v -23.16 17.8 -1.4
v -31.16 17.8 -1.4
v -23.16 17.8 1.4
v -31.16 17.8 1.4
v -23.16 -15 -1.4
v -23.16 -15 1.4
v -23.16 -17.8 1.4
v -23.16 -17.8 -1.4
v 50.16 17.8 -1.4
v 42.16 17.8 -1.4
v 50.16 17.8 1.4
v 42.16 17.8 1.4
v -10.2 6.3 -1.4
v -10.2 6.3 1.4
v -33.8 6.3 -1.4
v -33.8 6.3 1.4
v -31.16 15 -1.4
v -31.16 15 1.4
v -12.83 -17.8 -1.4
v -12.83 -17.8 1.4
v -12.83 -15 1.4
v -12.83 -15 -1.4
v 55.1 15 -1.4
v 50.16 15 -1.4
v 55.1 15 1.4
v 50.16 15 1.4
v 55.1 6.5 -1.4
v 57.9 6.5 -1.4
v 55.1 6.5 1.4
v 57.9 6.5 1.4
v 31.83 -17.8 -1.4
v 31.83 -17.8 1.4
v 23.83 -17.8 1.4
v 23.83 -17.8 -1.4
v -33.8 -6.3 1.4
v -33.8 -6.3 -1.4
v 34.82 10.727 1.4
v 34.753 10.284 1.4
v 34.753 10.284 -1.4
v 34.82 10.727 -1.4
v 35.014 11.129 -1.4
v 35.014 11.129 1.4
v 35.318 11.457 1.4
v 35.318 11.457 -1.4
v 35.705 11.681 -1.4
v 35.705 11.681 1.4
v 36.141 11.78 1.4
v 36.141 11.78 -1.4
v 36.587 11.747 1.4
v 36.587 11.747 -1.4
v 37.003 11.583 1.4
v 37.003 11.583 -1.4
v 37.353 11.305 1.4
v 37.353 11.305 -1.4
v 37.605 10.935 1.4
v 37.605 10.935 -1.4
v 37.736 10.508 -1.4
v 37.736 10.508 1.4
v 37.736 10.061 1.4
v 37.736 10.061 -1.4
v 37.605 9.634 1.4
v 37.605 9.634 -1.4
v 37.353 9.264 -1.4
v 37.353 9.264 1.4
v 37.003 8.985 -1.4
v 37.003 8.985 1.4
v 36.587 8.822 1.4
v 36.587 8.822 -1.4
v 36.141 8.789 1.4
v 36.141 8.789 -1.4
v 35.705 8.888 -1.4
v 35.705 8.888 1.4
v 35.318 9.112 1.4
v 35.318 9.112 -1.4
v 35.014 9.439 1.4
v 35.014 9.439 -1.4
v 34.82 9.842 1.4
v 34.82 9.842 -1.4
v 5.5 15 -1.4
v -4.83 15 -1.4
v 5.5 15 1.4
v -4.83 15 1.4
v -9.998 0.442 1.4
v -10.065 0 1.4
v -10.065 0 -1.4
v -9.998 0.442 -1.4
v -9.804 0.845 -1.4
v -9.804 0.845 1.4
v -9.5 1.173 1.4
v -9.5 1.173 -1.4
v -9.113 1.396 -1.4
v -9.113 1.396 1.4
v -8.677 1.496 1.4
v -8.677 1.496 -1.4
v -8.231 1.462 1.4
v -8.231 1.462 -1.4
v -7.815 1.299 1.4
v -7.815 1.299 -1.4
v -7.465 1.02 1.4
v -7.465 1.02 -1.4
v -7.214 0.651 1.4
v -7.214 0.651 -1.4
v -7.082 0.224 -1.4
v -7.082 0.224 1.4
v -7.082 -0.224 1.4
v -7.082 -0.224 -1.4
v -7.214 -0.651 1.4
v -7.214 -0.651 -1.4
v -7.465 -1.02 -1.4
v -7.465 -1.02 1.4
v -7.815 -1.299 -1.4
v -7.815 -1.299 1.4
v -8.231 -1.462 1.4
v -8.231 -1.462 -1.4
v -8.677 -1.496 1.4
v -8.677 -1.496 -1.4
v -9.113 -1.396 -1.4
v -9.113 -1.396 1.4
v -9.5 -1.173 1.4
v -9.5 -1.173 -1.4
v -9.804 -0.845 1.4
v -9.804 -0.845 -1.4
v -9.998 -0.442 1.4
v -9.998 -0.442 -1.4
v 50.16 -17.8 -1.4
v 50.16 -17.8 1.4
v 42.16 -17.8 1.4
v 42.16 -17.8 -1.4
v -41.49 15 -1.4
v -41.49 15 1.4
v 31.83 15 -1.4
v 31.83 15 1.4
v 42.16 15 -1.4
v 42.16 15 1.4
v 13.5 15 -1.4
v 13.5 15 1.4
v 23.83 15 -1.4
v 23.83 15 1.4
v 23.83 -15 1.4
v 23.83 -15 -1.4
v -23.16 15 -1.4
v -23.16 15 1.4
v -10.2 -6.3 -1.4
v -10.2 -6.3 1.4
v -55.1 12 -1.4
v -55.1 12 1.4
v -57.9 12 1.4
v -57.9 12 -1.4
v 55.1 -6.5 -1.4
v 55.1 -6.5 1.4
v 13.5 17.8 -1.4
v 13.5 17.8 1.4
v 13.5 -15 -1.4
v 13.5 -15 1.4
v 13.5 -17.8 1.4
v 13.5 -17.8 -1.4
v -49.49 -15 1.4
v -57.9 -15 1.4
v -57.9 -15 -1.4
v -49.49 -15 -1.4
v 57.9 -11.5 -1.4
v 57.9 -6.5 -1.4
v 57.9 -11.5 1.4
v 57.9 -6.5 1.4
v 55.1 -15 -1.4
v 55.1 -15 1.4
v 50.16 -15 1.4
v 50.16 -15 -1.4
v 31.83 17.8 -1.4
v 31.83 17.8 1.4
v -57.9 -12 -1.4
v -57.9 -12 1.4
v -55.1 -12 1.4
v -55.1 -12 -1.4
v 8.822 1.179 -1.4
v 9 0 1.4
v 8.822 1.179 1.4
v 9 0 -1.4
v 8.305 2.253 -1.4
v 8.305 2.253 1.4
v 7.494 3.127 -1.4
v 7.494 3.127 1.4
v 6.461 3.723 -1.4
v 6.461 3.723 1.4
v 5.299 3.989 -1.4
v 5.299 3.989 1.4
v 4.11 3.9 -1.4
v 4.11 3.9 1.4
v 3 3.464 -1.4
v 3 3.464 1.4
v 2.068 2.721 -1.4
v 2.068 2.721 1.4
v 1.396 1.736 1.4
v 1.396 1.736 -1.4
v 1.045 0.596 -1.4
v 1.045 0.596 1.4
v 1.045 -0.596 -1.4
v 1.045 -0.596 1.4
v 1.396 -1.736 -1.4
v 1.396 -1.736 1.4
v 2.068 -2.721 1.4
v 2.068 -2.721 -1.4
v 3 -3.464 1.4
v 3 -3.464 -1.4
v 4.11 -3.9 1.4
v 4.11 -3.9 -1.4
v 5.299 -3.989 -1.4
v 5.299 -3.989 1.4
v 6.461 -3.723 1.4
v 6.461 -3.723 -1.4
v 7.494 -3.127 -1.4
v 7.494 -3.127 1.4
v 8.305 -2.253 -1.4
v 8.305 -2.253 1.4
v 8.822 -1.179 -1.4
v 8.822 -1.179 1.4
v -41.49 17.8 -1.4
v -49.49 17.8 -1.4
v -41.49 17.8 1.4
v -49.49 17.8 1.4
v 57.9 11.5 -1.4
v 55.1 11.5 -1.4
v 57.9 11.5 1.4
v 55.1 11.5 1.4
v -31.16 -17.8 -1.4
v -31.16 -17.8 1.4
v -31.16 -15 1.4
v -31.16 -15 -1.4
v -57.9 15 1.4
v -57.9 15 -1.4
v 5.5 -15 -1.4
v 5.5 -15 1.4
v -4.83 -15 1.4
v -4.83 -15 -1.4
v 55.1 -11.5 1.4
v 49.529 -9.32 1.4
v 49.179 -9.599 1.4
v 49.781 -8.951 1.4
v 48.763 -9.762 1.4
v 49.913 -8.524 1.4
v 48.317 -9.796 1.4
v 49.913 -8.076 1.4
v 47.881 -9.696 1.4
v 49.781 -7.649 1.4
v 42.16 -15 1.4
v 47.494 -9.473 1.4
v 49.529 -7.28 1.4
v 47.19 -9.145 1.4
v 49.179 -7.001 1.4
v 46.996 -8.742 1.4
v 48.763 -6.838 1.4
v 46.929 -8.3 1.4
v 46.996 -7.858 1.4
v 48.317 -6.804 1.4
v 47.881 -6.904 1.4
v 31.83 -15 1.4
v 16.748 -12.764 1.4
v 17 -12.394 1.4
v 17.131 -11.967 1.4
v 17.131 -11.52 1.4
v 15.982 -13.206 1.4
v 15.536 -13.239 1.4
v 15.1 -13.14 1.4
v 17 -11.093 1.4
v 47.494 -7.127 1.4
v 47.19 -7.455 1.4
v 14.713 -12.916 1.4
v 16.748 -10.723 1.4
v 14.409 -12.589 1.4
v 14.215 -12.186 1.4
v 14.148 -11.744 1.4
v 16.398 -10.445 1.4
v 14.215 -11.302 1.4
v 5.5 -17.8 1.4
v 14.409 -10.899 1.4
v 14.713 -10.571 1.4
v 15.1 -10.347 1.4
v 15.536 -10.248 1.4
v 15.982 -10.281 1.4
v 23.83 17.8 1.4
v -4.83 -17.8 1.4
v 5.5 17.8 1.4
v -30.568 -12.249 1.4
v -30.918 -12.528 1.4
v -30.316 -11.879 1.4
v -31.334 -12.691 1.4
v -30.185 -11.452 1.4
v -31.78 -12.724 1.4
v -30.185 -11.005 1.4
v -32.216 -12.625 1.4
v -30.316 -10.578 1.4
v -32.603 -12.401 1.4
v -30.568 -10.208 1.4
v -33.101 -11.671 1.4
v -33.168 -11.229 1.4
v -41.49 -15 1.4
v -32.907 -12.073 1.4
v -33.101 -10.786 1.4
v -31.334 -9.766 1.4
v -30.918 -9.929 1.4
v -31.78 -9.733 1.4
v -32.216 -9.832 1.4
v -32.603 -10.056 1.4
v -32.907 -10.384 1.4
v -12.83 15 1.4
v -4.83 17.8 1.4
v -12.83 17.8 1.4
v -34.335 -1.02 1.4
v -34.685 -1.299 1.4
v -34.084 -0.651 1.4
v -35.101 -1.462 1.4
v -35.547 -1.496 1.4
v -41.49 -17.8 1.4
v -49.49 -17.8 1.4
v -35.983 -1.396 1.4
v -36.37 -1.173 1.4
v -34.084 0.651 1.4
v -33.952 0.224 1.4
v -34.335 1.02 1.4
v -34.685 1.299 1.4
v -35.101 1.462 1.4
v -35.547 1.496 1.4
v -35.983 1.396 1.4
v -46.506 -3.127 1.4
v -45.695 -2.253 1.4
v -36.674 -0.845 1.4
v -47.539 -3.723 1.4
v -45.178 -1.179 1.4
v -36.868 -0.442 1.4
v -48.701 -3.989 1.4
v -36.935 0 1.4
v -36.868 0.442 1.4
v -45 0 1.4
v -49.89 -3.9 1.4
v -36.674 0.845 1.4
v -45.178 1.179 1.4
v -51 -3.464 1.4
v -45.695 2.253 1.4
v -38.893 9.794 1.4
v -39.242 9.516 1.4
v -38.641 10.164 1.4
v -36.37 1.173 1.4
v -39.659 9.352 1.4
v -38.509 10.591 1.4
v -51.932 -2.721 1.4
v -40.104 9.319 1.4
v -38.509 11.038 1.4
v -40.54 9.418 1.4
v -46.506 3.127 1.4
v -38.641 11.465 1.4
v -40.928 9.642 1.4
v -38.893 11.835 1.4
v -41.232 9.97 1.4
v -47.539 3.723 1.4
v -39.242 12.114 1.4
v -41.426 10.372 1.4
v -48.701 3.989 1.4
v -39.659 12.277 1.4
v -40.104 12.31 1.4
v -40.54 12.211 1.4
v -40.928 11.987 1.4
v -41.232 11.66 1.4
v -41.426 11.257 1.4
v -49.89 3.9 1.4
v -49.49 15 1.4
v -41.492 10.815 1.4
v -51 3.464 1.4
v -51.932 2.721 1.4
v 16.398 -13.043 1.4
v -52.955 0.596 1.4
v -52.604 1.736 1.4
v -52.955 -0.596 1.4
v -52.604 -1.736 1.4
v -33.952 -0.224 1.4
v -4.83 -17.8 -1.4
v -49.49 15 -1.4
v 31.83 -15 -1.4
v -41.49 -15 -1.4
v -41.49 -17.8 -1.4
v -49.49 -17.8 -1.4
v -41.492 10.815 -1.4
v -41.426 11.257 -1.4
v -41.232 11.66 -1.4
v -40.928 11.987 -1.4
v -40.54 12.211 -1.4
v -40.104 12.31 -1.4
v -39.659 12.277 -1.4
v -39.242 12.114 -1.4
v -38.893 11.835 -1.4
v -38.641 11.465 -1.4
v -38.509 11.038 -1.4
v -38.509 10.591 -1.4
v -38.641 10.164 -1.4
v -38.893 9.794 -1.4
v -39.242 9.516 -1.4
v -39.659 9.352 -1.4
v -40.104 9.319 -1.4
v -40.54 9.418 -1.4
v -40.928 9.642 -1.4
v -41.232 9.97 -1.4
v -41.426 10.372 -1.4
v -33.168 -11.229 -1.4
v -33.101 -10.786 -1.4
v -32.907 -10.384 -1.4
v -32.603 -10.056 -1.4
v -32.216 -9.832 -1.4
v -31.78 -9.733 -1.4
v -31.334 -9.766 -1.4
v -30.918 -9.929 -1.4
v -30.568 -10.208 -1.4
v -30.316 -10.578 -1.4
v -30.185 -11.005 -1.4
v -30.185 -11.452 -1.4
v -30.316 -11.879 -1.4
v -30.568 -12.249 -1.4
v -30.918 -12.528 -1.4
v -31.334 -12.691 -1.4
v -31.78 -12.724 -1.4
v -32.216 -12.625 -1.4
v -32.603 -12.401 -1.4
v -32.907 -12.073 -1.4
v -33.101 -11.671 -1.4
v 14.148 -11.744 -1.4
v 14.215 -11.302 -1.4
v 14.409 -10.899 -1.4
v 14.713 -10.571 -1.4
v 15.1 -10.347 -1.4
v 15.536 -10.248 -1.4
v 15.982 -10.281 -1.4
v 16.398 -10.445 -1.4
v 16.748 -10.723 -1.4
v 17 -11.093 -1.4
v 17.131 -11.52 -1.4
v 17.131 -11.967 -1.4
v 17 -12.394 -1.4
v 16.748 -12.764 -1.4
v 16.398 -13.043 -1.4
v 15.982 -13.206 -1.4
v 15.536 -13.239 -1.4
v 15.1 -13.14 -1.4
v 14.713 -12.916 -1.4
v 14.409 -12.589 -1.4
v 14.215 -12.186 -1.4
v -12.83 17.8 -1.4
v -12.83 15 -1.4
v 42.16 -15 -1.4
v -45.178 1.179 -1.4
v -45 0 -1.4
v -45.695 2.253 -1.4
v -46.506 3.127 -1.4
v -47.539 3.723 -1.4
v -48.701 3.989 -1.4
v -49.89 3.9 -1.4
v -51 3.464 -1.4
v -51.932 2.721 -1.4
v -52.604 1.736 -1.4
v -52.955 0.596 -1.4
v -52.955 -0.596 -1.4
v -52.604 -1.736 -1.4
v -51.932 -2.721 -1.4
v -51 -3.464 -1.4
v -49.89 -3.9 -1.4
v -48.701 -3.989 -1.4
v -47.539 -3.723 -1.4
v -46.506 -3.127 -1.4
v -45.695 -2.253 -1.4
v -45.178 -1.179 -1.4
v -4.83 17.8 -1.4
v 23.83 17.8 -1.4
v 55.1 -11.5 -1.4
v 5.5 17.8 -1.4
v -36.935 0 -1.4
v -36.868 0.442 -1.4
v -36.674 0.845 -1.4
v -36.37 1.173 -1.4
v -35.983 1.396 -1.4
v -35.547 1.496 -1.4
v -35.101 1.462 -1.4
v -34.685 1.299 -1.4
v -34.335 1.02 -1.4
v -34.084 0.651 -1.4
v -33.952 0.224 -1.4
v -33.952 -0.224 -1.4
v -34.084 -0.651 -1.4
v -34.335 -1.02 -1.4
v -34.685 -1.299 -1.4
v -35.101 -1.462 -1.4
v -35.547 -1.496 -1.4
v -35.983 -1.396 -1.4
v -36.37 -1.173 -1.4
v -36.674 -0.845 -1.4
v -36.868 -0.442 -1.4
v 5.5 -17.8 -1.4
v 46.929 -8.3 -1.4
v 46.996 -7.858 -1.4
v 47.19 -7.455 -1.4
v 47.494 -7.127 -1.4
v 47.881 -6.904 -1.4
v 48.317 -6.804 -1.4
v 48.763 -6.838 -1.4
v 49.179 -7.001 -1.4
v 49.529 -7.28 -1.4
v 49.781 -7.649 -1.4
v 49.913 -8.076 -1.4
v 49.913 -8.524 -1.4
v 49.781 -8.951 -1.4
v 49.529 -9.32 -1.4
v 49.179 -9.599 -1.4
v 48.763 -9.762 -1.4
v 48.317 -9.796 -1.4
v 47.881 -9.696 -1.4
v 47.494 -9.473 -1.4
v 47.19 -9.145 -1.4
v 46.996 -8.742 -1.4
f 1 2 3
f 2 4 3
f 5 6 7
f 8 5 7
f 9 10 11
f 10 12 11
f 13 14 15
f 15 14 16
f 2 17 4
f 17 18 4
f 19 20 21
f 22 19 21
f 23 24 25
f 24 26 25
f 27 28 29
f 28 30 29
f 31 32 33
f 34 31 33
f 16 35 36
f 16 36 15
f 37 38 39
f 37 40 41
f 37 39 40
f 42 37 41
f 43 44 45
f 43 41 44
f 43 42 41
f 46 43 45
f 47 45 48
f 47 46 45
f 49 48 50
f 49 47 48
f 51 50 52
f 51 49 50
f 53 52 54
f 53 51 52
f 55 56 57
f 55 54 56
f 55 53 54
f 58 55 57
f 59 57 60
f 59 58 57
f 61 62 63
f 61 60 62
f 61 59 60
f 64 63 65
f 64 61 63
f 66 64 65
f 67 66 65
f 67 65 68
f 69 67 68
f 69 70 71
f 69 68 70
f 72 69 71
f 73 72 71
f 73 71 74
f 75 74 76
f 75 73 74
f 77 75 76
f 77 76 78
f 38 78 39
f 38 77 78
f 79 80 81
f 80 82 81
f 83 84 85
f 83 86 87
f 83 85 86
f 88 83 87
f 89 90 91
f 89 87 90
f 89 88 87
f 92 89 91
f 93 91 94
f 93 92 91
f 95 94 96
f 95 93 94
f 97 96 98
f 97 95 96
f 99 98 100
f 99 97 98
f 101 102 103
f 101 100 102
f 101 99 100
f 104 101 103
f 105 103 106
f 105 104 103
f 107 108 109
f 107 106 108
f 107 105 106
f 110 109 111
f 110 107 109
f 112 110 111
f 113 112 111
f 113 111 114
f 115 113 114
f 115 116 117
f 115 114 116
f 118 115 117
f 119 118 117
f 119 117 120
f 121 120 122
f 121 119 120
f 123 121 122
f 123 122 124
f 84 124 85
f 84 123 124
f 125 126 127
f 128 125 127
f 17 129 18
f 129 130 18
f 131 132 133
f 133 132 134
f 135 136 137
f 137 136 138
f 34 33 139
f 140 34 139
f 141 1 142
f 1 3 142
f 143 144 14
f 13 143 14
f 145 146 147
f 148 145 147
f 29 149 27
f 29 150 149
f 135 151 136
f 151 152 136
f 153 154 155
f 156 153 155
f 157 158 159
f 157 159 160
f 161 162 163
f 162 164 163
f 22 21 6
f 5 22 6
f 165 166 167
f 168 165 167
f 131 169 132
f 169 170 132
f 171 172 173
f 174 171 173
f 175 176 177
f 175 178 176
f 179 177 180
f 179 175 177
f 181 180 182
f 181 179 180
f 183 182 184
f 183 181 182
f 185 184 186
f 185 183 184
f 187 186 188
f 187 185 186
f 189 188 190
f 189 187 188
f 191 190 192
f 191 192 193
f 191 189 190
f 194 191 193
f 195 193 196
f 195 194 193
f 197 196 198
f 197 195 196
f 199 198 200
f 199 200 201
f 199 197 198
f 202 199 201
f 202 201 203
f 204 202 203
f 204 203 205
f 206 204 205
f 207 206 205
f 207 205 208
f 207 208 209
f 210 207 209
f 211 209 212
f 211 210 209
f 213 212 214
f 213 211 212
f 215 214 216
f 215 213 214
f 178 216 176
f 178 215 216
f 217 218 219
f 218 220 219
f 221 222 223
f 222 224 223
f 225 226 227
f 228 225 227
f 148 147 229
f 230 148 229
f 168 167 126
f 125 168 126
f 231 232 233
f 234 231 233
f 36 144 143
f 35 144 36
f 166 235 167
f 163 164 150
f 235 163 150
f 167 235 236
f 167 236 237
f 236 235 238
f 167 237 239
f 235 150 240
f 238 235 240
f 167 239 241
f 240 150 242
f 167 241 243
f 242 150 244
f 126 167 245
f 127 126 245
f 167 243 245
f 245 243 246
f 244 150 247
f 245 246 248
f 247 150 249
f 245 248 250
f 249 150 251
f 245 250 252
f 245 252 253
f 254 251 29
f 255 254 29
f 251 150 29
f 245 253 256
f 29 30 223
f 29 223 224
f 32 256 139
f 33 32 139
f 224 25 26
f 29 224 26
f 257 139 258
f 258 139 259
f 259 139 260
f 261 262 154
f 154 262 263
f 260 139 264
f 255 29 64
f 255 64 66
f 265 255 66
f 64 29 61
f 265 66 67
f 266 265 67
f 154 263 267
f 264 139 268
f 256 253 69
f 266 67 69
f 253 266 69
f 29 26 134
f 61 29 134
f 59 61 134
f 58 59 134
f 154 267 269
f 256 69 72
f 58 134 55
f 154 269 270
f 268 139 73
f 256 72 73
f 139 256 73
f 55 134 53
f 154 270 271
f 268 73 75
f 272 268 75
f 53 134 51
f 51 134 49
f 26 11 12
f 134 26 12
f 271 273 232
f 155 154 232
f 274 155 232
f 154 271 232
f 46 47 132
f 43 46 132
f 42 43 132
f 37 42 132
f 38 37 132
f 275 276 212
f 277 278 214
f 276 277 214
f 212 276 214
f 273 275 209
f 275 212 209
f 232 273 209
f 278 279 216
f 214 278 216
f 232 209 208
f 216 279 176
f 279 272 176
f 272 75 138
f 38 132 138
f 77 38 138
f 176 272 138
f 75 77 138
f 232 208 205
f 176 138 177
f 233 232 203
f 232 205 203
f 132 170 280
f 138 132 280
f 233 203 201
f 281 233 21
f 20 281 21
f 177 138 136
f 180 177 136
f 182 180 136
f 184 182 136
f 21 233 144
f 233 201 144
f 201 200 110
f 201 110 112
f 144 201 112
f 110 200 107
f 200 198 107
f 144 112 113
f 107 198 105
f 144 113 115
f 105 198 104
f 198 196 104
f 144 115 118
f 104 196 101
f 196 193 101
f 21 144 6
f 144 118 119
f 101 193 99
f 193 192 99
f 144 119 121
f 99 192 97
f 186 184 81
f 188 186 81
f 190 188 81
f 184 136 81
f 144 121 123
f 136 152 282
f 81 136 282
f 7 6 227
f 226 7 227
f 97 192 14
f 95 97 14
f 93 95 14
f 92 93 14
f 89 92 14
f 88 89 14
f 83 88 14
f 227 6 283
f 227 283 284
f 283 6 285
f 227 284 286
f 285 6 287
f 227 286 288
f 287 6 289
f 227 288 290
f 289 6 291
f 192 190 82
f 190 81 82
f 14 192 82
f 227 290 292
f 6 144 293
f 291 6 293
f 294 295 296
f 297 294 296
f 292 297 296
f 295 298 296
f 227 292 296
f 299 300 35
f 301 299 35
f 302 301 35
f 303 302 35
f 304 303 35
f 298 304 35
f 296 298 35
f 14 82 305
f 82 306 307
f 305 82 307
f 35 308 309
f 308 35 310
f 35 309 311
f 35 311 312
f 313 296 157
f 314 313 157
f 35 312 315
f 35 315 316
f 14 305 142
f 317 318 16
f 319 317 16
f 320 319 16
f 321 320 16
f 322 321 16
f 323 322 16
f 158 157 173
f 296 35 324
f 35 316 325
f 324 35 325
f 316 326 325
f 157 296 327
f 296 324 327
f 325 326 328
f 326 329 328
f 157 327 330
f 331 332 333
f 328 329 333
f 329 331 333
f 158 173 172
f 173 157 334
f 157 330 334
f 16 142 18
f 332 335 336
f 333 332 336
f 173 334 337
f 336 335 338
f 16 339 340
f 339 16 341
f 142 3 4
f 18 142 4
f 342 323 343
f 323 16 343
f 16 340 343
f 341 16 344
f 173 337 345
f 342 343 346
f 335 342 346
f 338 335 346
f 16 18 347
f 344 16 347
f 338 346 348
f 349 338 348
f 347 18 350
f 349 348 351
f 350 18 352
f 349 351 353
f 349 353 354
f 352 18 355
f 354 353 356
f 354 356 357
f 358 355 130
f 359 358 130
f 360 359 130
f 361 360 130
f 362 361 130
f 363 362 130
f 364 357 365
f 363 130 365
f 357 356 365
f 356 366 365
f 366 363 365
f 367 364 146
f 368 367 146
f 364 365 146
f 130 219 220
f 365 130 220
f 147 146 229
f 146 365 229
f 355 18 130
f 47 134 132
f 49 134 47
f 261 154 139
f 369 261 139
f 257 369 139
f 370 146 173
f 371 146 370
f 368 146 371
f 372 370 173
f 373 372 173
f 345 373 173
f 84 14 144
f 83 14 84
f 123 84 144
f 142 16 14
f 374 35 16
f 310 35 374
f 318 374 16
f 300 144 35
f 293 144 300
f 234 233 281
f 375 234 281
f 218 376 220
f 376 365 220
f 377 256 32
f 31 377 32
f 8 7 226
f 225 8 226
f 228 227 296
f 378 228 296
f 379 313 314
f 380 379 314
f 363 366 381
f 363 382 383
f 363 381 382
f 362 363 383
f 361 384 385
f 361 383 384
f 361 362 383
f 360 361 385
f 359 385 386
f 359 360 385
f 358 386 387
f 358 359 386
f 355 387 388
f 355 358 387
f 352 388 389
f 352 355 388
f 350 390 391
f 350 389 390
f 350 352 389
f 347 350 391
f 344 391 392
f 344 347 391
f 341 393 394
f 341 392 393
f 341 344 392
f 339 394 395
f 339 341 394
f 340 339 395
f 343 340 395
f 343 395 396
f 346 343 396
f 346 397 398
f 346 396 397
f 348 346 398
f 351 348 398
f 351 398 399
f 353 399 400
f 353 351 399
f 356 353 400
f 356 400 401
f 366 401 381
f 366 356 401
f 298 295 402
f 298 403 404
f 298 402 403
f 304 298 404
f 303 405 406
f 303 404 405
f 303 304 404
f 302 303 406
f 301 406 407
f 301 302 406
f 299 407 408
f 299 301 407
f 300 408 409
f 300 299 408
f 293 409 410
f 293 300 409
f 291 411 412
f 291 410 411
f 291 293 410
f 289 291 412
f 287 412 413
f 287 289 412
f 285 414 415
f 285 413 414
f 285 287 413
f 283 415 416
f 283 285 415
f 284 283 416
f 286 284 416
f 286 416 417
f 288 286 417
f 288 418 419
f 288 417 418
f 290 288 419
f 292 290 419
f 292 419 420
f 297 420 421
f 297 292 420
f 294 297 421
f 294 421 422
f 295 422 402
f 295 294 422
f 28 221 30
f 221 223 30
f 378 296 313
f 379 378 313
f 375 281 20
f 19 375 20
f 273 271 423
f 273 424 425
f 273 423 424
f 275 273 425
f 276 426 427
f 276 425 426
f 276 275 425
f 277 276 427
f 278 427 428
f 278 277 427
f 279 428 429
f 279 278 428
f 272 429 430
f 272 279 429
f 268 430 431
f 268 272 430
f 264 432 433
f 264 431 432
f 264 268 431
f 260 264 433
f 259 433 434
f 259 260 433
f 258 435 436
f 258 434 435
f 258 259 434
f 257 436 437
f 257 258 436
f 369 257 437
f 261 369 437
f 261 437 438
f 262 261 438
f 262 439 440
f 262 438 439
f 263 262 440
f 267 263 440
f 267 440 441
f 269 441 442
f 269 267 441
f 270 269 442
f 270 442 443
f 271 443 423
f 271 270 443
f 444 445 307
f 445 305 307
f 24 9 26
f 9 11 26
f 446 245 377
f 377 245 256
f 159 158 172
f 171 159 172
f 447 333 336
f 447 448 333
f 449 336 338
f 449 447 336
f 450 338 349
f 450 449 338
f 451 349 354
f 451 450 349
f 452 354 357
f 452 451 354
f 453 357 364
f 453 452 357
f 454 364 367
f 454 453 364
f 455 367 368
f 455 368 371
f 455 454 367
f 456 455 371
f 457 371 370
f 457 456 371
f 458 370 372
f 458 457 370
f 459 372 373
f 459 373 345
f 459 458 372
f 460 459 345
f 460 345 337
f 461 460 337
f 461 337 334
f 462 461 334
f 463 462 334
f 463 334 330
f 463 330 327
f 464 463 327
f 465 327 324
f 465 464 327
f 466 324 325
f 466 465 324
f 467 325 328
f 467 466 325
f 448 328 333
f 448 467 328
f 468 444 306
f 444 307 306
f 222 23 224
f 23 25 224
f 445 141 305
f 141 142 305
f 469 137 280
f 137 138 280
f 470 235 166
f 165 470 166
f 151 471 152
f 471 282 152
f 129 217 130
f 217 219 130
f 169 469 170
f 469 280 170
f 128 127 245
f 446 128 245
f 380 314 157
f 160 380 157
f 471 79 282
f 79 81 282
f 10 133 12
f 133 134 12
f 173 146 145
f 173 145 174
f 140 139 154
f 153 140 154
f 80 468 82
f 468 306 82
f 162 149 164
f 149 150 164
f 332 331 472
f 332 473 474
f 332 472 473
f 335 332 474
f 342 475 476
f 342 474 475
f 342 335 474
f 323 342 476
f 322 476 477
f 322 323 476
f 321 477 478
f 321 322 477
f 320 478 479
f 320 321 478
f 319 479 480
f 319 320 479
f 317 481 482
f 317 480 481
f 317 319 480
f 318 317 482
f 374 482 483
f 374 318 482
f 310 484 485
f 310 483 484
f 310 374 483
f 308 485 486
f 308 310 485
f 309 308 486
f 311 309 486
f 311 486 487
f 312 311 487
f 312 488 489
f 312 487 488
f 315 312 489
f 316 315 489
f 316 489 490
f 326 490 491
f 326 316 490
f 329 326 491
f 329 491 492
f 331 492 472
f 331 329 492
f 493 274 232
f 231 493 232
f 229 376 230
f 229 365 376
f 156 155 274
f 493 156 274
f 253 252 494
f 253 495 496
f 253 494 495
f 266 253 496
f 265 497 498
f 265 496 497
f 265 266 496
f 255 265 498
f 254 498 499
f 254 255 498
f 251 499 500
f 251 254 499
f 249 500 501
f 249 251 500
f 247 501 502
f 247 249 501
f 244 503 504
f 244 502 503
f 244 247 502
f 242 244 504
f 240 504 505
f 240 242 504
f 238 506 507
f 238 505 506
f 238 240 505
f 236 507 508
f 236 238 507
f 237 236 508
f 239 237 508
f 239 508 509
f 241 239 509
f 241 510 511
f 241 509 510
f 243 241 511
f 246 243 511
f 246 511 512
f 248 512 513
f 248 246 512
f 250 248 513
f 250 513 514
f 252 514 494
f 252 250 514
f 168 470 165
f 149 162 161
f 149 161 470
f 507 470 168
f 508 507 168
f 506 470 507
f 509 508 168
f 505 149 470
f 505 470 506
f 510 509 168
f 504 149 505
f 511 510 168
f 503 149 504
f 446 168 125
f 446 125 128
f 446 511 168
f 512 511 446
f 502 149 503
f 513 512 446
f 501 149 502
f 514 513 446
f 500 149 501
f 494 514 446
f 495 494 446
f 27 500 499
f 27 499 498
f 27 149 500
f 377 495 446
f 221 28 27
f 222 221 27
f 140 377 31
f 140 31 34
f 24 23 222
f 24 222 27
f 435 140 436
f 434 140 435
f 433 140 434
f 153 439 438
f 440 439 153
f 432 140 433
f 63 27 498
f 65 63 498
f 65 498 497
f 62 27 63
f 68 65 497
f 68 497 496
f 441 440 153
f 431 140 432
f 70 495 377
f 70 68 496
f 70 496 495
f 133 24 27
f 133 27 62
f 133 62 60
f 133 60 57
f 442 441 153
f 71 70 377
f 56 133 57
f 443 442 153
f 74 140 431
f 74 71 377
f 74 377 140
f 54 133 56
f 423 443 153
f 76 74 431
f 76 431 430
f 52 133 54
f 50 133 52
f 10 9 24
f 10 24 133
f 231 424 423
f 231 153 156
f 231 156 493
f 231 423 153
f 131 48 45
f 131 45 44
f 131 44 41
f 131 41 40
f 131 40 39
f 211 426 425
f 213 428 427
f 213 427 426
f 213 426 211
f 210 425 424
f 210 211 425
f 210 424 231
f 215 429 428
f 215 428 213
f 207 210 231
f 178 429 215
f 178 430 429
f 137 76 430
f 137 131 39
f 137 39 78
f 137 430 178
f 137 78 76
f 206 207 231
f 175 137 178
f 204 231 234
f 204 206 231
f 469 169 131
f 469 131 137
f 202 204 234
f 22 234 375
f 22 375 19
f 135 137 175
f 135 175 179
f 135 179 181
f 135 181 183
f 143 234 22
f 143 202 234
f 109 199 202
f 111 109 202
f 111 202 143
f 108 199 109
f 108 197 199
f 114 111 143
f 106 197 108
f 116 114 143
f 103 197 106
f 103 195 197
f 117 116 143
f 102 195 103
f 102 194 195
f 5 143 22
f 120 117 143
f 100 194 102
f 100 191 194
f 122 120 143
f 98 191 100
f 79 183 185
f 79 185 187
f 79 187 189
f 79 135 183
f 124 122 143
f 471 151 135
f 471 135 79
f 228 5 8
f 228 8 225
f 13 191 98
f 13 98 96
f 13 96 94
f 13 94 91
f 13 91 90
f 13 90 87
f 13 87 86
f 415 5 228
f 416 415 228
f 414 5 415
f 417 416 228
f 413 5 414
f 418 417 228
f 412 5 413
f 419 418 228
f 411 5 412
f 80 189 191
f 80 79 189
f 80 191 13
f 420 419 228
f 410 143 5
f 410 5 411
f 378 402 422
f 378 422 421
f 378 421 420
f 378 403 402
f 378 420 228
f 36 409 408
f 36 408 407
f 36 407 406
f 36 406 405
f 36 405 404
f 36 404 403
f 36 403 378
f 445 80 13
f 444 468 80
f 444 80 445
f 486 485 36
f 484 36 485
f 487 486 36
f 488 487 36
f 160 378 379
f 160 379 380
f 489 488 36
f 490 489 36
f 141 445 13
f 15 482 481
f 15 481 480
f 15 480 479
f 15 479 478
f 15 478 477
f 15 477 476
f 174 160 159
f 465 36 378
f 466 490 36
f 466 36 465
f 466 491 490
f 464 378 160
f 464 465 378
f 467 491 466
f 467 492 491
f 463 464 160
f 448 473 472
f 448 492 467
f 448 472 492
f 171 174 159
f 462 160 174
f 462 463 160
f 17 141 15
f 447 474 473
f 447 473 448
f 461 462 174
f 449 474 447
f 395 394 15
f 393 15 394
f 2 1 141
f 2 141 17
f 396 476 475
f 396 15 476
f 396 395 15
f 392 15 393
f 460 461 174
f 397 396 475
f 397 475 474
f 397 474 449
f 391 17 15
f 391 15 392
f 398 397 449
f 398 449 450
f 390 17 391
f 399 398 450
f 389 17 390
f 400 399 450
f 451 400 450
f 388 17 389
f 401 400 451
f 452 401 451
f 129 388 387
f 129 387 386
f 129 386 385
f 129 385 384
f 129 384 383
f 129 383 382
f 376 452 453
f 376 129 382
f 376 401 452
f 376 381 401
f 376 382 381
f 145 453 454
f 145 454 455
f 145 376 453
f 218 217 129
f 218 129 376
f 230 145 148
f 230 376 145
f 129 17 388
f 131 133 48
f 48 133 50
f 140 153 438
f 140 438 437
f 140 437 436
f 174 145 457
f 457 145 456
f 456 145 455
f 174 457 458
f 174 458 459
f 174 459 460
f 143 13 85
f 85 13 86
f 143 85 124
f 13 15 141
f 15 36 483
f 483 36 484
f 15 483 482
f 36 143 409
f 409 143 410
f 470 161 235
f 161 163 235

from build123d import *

# Parameters (mm, degrees)
SKETCH_1_R               = 4
EXTRUDE_1_DEPTH          = 1.4
CUT_EXTRUDE_1_DEPTH      = 61.639013844
CUT_EXTRUDE_1_DEPTH_BACK = 61.639013844
SKETCH_2_W               = 23.6
SKETCH_2_H               = 12.6
SKETCH_2_R               = 1.5
CUT_EXTRUDE_2_DEPTH      = 61.639013844
CUT_EXTRUDE_2_DEPTH_BACK = 61.639013844
SKETCH_3_R               = 1.5
SKETCH_3_R_2             = 1.499999999
SKETCH_3_R_3             = 1.500000004


with BuildPart() as part:
    # Эскиз1 → Бобышка-Вытянуть1 (new, symmetric)
    with BuildSketch(Plane.XY):
        Polygon((-55.1, 15), (-49.49, 15), (-49.49, 17.8), (-41.49, 17.8), (-41.49, 15), (-31.16, 15), (-31.16, 17.8), (-23.16, 17.8), (-23.16, 15), (-12.83, 15), (-12.83, 17.8), (-4.83, 17.8), (-4.83, 15), (5.5, 15), (5.5, 17.8), (13.5, 17.8), (13.5, 15), (23.83, 15), (23.83, 17.8), (31.83, 17.8), (31.83, 15), (42.16, 15), (42.16, 17.8), (50.16, 17.8), (50.16, 15), (55.1, 15), (55.1, 11.5), (57.9, 11.5), (57.9, 6.5), (55.1, 6.5), (55.1, 5), (55.1, -5), (55.1, -6.5), (57.9, -6.5), (57.9, -11.5), (55.1, -11.5), (55.1, -15), (50.16, -15), (50.16, -17.8), (42.16, -17.8), (42.16, -15), (31.83, -15), (31.83, -17.8), (23.83, -17.8), (23.83, -15), (13.5, -15), (13.5, -17.8), (5.5, -17.8), (5.5, -15), (-4.83, -15), (-4.83, -17.8), (-12.83, -17.8), (-12.83, -15), (-23.16, -15), (-23.16, -17.8), (-31.16, -17.8), (-31.16, -15), (-41.49, -15), (-41.49, -17.8), (-49.49, -17.8), (-49.49, -15), (-55.1, -15), (-57.9, -15), (-57.9, -12), (-55.1, -12), (-55.1, -11.5), (-55.1, -6.5), (-55.1, -5), (-55.1, 5), (-55.1, 6.5), (-55.1, 11.5), (-55.1, 12), (-57.9, 12), (-57.9, 15), align=None)
        with Locations((5, 0)):
            Circle(SKETCH_1_R, mode=Mode.SUBTRACT)
        with Locations((-49, 0)):
            Circle(SKETCH_1_R, mode=Mode.SUBTRACT)
    extrude(amount=EXTRUDE_1_DEPTH, both=True)

    # Эскиз2 → Вырез-Вытянуть1 (cut, two sides: drawn at the far end of the back side and taken through both)
    with BuildSketch(Plane(origin=(0, 0, -1.4), x_dir=(-1, 0, 0), z_dir=(0, 0, -1)).offset(-CUT_EXTRUDE_1_DEPTH_BACK)):
        with Locations((22, 0)):
            Rectangle(SKETCH_2_W, SKETCH_2_H)
        with Locations((8.565, 0)):
            Circle(SKETCH_2_R)
        with Locations((35.435, 0)):
            Circle(SKETCH_2_R)
    extrude(amount=CUT_EXTRUDE_1_DEPTH + CUT_EXTRUDE_1_DEPTH_BACK, mode=Mode.SUBTRACT)

    # Эскиз3 → Вырез-Вытянуть2 (cut, two sides: drawn at the far end of the back side and taken through both)
    with BuildSketch(Plane(origin=(0, 0, -1.4), x_dir=(-1, 0, 0), z_dir=(0, 0, -1)).offset(-CUT_EXTRUDE_2_DEPTH_BACK)):
        with Locations((31.667851618, -11.228512478)):
            Circle(SKETCH_3_R)
        with Locations((-48.429379636, -8.299999991)):
            Circle(SKETCH_3_R_2)
        with Locations((-15.648202479, -11.743667469)):
            Circle(SKETCH_3_R_2)
        with Locations((39.99236744, 10.8145639)):
            Circle(SKETCH_3_R)
        with Locations((-36.253127984, 10.284376689)):
            Circle(SKETCH_3_R_3)
    extrude(amount=CUT_EXTRUDE_2_DEPTH + CUT_EXTRUDE_2_DEPTH_BACK, mode=Mode.SUBTRACT)


solid = part.part
